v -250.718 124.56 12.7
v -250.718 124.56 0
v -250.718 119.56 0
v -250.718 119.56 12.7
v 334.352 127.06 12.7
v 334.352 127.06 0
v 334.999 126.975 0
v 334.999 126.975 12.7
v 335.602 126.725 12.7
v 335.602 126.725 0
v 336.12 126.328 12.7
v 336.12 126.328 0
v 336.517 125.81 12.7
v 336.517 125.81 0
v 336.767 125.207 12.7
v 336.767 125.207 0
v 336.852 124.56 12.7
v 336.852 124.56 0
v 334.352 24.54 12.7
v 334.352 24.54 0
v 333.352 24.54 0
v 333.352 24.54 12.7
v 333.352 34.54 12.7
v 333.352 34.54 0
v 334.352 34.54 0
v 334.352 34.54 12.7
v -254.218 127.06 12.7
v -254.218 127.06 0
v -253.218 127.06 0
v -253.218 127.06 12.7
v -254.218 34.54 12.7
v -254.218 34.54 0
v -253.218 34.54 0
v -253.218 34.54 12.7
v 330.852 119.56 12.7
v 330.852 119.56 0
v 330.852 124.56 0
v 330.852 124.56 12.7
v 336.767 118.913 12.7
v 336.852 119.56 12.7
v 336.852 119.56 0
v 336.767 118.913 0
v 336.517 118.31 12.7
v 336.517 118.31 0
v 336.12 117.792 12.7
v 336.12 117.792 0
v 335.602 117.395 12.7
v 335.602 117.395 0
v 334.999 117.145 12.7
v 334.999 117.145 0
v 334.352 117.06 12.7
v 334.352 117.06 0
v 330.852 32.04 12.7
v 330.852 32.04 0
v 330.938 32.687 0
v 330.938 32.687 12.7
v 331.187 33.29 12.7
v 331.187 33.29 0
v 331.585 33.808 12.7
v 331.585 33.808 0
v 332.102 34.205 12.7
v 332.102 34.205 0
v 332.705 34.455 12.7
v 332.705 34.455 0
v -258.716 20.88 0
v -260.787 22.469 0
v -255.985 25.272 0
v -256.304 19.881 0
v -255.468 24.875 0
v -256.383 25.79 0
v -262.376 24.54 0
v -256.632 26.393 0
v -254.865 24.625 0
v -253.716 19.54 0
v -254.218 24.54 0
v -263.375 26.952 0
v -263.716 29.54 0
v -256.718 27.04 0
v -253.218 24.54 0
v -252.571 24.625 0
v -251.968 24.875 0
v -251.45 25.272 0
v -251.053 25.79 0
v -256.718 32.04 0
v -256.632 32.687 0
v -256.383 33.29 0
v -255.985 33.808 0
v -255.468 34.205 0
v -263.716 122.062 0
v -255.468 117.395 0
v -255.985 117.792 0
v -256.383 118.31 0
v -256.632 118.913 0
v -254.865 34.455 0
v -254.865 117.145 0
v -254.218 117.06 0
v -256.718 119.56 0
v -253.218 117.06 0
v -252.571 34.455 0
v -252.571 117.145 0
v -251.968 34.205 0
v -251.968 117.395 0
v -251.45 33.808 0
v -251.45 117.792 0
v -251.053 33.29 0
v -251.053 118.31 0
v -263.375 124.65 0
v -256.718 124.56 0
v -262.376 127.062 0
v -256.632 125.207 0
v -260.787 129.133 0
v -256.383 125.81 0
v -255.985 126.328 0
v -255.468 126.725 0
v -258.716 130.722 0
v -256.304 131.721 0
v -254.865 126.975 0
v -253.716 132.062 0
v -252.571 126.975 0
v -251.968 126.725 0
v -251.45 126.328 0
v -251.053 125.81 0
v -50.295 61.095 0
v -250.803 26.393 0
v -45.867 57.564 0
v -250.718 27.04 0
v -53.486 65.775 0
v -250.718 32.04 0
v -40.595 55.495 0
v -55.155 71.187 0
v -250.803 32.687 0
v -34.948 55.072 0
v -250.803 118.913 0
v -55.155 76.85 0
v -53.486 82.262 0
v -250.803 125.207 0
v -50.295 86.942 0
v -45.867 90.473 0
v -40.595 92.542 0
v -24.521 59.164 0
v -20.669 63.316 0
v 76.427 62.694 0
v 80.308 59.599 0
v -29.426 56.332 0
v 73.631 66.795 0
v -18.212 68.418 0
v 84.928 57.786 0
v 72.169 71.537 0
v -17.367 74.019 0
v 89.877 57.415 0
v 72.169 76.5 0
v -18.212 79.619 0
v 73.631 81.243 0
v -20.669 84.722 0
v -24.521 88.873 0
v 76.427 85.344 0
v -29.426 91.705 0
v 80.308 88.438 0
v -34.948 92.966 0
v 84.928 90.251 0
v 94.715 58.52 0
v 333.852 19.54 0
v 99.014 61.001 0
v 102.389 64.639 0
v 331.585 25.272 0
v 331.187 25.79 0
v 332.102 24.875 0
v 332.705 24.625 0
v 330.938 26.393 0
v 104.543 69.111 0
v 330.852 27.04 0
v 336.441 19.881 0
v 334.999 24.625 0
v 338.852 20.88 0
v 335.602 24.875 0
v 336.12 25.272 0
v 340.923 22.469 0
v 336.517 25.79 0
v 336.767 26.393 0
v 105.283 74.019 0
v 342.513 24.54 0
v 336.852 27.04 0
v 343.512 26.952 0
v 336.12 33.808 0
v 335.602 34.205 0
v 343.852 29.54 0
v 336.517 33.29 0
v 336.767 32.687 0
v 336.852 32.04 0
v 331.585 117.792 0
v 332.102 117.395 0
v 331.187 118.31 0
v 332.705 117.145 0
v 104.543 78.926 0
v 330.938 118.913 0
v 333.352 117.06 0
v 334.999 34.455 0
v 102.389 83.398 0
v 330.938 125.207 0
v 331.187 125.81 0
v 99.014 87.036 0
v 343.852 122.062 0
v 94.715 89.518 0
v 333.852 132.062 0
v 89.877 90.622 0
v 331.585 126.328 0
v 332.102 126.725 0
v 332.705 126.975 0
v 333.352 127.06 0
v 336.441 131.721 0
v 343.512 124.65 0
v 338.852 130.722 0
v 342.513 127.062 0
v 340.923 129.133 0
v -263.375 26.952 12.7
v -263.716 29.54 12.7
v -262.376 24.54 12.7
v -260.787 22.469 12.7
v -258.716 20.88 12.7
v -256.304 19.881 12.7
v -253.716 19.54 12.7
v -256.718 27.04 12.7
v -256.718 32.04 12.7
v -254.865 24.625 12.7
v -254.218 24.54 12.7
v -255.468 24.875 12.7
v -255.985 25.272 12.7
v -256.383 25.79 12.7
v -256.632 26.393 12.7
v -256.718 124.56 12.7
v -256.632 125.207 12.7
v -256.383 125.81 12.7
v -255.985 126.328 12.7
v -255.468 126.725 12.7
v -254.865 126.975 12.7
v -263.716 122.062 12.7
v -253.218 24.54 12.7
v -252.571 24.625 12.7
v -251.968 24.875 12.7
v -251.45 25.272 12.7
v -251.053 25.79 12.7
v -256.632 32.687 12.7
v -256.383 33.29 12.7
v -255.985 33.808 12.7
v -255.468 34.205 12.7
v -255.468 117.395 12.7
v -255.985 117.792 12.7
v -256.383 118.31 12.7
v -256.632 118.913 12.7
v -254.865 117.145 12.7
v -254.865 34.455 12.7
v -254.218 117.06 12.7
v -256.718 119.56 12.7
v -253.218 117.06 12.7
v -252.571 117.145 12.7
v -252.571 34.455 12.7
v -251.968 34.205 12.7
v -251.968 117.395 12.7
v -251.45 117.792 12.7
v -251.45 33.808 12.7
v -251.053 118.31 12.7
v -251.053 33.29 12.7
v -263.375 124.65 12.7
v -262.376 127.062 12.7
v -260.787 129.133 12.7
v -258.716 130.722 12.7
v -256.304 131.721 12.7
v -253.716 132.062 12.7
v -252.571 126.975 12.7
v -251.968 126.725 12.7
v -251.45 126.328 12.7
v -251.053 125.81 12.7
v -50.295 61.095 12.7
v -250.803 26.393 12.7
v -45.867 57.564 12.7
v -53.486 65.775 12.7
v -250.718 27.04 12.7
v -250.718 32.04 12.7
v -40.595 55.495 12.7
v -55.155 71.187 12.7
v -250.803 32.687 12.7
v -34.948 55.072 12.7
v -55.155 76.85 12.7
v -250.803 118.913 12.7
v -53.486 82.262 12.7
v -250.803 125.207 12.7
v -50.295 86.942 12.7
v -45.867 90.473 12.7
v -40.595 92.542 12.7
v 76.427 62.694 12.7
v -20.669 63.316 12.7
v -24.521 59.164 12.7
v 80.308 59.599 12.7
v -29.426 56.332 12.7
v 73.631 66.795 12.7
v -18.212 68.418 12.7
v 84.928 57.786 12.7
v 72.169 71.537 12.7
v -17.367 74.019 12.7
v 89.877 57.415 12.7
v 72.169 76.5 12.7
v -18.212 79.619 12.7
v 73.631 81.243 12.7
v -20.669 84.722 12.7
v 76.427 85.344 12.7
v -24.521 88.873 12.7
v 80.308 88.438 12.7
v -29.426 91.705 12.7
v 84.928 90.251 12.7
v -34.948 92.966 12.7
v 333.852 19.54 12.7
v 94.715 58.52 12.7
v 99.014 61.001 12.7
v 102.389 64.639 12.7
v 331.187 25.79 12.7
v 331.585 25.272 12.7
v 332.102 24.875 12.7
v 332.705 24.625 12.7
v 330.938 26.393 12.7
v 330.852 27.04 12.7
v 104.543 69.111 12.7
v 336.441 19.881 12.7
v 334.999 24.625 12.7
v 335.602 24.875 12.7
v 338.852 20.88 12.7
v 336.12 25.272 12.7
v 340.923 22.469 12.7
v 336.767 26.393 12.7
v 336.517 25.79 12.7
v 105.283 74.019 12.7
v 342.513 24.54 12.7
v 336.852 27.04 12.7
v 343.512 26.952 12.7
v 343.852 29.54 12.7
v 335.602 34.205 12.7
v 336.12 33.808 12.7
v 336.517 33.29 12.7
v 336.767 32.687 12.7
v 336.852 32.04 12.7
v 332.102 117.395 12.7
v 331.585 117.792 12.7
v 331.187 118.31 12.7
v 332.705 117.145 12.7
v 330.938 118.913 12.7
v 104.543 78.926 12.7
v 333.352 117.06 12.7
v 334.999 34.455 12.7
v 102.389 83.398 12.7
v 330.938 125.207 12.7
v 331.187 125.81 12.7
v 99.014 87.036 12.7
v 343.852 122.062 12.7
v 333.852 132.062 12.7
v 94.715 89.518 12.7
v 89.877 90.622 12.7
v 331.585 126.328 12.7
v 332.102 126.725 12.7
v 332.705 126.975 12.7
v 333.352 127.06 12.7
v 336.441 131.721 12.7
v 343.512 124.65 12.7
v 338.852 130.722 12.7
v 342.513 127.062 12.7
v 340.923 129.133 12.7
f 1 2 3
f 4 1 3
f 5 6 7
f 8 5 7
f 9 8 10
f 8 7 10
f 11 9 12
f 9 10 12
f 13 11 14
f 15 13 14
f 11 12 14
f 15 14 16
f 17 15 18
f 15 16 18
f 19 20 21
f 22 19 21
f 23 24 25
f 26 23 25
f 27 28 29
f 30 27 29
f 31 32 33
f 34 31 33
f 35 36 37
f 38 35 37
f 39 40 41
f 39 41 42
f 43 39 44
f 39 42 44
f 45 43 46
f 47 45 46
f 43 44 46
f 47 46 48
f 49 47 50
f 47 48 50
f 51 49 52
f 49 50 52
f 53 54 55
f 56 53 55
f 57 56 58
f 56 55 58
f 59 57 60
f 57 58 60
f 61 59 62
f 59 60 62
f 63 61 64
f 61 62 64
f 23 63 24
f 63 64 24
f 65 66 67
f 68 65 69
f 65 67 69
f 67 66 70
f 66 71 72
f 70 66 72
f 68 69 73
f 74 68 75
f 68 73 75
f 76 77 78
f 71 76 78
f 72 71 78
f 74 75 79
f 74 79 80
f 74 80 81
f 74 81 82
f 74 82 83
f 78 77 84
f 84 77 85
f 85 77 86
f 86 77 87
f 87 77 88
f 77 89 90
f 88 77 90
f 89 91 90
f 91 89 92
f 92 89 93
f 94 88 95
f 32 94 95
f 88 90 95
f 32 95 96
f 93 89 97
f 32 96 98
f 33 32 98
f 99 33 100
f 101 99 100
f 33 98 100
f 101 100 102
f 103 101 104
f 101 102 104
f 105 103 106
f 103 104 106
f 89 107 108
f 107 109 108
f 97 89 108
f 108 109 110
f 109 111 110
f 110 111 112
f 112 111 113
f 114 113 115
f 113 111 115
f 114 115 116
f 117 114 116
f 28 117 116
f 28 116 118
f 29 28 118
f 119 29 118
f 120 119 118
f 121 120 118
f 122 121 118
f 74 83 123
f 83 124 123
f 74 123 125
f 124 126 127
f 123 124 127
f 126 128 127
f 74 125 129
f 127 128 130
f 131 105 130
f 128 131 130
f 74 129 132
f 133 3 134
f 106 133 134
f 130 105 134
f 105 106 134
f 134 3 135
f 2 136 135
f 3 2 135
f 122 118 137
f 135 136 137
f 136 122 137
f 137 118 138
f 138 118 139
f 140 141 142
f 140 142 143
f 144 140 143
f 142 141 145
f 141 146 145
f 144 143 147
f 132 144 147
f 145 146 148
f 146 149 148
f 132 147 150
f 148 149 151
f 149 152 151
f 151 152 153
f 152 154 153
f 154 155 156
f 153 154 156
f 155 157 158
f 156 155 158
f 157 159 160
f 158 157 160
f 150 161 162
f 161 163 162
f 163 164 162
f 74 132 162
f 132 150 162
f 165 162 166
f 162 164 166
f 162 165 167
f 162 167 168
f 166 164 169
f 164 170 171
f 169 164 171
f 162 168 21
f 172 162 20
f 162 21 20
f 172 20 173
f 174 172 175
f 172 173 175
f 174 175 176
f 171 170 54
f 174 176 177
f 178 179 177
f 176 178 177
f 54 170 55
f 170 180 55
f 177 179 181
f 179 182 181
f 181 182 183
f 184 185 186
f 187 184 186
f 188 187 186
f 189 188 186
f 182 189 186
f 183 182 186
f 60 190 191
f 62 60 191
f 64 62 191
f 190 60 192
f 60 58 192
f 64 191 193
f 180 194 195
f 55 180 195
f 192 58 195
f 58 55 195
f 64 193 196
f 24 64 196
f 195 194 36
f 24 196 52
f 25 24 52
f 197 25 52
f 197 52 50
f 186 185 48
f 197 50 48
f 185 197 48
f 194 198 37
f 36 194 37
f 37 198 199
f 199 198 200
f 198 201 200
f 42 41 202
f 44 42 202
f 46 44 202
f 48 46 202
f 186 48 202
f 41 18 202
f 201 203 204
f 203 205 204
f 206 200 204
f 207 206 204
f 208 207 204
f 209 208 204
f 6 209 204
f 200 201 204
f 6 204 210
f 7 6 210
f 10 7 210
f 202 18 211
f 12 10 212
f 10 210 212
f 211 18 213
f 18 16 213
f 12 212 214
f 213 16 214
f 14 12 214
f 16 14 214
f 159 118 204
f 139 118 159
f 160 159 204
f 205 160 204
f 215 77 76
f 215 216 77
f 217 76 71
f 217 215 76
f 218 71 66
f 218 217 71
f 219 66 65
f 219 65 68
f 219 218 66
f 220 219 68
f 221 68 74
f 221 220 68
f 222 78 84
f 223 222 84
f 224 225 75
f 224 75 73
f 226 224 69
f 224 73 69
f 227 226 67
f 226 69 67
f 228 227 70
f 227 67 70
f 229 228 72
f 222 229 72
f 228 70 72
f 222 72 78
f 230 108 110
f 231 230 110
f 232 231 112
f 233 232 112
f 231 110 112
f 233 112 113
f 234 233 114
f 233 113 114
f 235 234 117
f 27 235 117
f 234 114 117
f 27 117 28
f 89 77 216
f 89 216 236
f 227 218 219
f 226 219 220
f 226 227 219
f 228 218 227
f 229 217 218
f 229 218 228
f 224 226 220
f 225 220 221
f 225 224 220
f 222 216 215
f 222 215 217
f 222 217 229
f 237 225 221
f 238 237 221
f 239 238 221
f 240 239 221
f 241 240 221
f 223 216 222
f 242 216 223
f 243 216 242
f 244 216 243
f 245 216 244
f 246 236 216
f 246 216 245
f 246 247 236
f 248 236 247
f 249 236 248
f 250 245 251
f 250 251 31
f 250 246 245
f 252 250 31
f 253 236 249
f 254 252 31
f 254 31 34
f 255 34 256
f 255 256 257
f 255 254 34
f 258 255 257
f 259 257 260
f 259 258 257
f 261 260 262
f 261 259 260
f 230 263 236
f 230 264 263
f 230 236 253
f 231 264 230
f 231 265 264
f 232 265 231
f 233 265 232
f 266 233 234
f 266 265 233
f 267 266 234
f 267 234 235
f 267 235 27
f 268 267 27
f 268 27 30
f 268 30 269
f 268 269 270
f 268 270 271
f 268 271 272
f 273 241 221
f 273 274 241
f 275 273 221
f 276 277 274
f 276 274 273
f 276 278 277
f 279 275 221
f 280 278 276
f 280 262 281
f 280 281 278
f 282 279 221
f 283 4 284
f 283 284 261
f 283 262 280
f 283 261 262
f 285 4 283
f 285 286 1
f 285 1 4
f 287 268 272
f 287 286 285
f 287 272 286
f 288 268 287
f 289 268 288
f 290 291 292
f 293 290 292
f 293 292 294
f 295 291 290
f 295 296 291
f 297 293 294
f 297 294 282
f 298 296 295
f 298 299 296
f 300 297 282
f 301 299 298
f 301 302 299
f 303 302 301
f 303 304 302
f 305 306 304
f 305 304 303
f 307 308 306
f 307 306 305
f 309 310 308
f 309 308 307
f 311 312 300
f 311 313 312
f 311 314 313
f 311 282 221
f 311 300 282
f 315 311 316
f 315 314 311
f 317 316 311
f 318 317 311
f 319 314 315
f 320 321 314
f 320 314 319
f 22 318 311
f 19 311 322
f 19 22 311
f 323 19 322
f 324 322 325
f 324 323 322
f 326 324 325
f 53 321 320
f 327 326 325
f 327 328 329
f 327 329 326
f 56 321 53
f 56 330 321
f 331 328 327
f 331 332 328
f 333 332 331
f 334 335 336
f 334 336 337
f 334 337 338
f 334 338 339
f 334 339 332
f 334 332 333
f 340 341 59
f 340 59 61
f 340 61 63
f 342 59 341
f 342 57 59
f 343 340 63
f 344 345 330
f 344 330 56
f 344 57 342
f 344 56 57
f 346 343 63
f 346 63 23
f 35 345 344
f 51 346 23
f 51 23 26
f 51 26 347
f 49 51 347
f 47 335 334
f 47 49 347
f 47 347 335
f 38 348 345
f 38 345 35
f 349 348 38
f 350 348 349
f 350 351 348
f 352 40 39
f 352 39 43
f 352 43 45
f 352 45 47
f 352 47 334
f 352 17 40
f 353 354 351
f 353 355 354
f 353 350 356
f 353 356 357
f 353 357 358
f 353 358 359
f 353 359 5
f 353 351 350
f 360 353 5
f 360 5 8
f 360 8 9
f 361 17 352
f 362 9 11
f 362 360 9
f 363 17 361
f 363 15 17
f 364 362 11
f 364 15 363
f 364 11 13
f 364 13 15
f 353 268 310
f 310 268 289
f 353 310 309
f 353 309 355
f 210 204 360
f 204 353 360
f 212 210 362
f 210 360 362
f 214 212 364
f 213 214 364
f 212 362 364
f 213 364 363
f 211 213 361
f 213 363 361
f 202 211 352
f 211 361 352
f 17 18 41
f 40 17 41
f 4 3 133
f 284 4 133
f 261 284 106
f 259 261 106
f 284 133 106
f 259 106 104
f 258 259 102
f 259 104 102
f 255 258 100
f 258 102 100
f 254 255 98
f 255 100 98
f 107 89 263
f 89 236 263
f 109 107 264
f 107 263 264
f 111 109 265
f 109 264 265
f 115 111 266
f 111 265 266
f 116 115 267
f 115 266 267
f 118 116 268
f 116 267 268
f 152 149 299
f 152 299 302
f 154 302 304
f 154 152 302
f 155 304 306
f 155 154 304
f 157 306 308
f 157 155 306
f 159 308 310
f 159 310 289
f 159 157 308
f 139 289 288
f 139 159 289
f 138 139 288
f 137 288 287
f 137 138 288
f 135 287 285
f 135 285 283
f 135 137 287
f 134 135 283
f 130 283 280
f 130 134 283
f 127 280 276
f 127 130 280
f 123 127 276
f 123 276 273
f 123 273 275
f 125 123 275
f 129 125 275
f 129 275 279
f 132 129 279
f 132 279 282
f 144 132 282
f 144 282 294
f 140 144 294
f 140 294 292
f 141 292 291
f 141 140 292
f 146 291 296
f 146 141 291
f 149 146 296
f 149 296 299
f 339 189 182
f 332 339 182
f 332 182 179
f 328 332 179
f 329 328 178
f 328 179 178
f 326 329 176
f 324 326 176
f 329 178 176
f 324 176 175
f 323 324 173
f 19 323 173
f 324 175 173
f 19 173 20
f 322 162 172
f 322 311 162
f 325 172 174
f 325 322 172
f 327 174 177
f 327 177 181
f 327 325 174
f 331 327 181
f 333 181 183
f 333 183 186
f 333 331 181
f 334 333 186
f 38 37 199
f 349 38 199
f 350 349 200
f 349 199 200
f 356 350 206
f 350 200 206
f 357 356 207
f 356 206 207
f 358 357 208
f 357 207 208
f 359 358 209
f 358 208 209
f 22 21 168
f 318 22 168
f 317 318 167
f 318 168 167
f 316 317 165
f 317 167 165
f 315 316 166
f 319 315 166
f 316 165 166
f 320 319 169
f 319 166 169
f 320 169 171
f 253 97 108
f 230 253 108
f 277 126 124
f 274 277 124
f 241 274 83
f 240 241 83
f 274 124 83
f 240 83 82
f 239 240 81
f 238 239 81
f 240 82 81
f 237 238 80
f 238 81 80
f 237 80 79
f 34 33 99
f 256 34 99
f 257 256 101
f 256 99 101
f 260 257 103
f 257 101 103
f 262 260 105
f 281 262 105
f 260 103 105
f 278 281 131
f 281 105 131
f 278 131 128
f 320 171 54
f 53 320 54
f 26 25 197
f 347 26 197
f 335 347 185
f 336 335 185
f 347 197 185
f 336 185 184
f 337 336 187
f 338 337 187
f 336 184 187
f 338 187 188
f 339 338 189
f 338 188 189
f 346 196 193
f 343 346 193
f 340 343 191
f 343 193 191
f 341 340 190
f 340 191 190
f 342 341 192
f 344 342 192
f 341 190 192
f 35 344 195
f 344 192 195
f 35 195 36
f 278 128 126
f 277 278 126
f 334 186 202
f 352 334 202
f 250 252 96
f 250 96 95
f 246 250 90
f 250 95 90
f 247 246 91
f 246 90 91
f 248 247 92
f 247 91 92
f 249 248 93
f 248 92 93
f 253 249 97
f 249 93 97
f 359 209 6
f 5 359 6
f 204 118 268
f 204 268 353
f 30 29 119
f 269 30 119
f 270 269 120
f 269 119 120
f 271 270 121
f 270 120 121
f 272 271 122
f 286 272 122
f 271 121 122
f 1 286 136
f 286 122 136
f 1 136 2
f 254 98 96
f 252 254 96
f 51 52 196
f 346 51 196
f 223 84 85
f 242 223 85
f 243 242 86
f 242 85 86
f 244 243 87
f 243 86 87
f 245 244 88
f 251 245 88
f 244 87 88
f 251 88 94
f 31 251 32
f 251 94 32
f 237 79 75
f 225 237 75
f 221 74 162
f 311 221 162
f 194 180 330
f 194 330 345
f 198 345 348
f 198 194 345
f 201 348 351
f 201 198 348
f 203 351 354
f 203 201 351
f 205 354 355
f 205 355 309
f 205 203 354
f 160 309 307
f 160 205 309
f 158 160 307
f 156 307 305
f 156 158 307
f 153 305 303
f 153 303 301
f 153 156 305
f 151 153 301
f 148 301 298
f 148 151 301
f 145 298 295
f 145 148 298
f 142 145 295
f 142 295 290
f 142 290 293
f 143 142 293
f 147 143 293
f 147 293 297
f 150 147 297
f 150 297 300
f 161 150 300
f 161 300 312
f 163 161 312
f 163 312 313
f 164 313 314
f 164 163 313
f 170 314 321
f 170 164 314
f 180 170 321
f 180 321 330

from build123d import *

# Parameters (mm, degrees)
SKETCH1_W           = 607.568
SKETCH1_H           = 112.522
SKETCH1_R           = 16.65
SKETCH1_R_2         = 19
BOSS_EXTRUDE1_DEPTH = 12.7
FILLET1_R           = 10


with BuildPart() as part:
    # Sketch1 → Boss-Extrude1 (new body)
    with BuildSketch(Plane.XY):
        with Locations((40.068414536, 75.801223419)):
            Rectangle(SKETCH1_W, SKETCH1_H)
        with Locations((88.632564672, 74.018682095)):
            Circle(SKETCH1_R, mode=Mode.SUBTRACT)
        with Locations((-36.367435328, 74.018682095)):
            Circle(SKETCH1_R_2, mode=Mode.SUBTRACT)
        with BuildLine():
            Line((334.352414536, 24.540223419), (333.352414536, 24.540223419))
            ThreePointArc((333.352414536, 24.540223419), (331.584647583, 25.272456466), (330.852414536, 27.040223419))
            Line((330.852414536, 27.040223419), (330.852414536, 32.040223419))
            ThreePointArc((330.852414536, 32.040223419), (331.584647583, 33.807990372), (333.352414536, 34.540223419))
            Line((333.352414536, 34.540223419), (334.352414536, 34.540223419))
            ThreePointArc((334.352414536, 34.540223419), (336.120181489, 33.807990372), (336.852414536, 32.040223419))
            Line((336.852414536, 32.040223419), (336.852414536, 27.040223419))
            ThreePointArc((336.852414536, 27.040223419), (336.120181489, 25.272456466), (334.352414536, 24.540223419))
        make_face(mode=Mode.SUBTRACT)
        with BuildLine():
            Line((-253.217585464, 24.540223419), (-254.217585464, 24.540223419))
            ThreePointArc((-254.217585464, 24.540223419), (-255.985352417, 25.272456466), (-256.717585464, 27.040223419))
            Line((-256.717585464, 27.040223419), (-256.717585464, 32.040223419))
            ThreePointArc((-256.717585464, 32.040223419), (-255.985352417, 33.807990372), (-254.217585464, 34.540223419))
            Line((-254.217585464, 34.540223419), (-253.217585464, 34.540223419))
            ThreePointArc((-253.217585464, 34.540223419), (-251.449818511, 33.807990372), (-250.717585464, 32.040223419))
            Line((-250.717585464, 32.040223419), (-250.717585464, 27.040223419))
            ThreePointArc((-250.717585464, 27.040223419), (-251.449818511, 25.272456466), (-253.217585464, 24.540223419))
        make_face(mode=Mode.SUBTRACT)
        with BuildLine():
            Line((-253.217585464, 117.060223419), (-254.217585464, 117.060223419))
            ThreePointArc((-254.217585464, 117.060223419), (-255.985352417, 117.792456466), (-256.717585464, 119.560223419))
            Line((-256.717585464, 119.560223419), (-256.717585464, 124.560223419))
            ThreePointArc((-256.717585464, 124.560223419), (-255.985352417, 126.327990372), (-254.217585464, 127.060223419))
            Line((-254.217585464, 127.060223419), (-253.217585464, 127.060223419))
            ThreePointArc((-253.217585464, 127.060223419), (-251.449818511, 126.327990372), (-250.717585464, 124.560223419))
            Line((-250.717585464, 124.560223419), (-250.717585464, 119.560223419))
            ThreePointArc((-250.717585464, 119.560223419), (-251.449818511, 117.792456466), (-253.217585464, 117.060223419))
        make_face(mode=Mode.SUBTRACT)
        with BuildLine():
            Line((334.352414536, 117.060223419), (333.352414536, 117.060223419))
            ThreePointArc((333.352414536, 117.060223419), (331.584647583, 117.792456466), (330.852414536, 119.560223419))
            Line((330.852414536, 119.560223419), (330.852414536, 124.560223419))
            ThreePointArc((330.852414536, 124.560223419), (331.584647583, 126.327990372), (333.352414536, 127.060223419))
            Line((333.352414536, 127.060223419), (334.352414536, 127.060223419))
            ThreePointArc((334.352414536, 127.060223419), (336.120181489, 126.327990372), (336.852414536, 124.560223419))
            Line((336.852414536, 124.560223419), (336.852414536, 119.560223419))
            ThreePointArc((336.852414536, 119.560223419), (336.120181489, 117.792456466), (334.352414536, 117.060223419))
        make_face(mode=Mode.SUBTRACT)
    extrude(amount=BOSS_EXTRUDE1_DEPTH)

    # Fillet1
    fillet1_edges = [part.edges().sort_by_distance(p)[0] for p in [
        (-263.715585464, 132.062223419, 6.35),
        (-263.715585464, 19.540223419, 6.35),
        (343.852414536, 19.540223419, 6.35),
        (343.852414536, 132.062223419, 6.35),
    ]]
    fillet(fillet1_edges, radius=FILLET1_R)


solid = part.part
